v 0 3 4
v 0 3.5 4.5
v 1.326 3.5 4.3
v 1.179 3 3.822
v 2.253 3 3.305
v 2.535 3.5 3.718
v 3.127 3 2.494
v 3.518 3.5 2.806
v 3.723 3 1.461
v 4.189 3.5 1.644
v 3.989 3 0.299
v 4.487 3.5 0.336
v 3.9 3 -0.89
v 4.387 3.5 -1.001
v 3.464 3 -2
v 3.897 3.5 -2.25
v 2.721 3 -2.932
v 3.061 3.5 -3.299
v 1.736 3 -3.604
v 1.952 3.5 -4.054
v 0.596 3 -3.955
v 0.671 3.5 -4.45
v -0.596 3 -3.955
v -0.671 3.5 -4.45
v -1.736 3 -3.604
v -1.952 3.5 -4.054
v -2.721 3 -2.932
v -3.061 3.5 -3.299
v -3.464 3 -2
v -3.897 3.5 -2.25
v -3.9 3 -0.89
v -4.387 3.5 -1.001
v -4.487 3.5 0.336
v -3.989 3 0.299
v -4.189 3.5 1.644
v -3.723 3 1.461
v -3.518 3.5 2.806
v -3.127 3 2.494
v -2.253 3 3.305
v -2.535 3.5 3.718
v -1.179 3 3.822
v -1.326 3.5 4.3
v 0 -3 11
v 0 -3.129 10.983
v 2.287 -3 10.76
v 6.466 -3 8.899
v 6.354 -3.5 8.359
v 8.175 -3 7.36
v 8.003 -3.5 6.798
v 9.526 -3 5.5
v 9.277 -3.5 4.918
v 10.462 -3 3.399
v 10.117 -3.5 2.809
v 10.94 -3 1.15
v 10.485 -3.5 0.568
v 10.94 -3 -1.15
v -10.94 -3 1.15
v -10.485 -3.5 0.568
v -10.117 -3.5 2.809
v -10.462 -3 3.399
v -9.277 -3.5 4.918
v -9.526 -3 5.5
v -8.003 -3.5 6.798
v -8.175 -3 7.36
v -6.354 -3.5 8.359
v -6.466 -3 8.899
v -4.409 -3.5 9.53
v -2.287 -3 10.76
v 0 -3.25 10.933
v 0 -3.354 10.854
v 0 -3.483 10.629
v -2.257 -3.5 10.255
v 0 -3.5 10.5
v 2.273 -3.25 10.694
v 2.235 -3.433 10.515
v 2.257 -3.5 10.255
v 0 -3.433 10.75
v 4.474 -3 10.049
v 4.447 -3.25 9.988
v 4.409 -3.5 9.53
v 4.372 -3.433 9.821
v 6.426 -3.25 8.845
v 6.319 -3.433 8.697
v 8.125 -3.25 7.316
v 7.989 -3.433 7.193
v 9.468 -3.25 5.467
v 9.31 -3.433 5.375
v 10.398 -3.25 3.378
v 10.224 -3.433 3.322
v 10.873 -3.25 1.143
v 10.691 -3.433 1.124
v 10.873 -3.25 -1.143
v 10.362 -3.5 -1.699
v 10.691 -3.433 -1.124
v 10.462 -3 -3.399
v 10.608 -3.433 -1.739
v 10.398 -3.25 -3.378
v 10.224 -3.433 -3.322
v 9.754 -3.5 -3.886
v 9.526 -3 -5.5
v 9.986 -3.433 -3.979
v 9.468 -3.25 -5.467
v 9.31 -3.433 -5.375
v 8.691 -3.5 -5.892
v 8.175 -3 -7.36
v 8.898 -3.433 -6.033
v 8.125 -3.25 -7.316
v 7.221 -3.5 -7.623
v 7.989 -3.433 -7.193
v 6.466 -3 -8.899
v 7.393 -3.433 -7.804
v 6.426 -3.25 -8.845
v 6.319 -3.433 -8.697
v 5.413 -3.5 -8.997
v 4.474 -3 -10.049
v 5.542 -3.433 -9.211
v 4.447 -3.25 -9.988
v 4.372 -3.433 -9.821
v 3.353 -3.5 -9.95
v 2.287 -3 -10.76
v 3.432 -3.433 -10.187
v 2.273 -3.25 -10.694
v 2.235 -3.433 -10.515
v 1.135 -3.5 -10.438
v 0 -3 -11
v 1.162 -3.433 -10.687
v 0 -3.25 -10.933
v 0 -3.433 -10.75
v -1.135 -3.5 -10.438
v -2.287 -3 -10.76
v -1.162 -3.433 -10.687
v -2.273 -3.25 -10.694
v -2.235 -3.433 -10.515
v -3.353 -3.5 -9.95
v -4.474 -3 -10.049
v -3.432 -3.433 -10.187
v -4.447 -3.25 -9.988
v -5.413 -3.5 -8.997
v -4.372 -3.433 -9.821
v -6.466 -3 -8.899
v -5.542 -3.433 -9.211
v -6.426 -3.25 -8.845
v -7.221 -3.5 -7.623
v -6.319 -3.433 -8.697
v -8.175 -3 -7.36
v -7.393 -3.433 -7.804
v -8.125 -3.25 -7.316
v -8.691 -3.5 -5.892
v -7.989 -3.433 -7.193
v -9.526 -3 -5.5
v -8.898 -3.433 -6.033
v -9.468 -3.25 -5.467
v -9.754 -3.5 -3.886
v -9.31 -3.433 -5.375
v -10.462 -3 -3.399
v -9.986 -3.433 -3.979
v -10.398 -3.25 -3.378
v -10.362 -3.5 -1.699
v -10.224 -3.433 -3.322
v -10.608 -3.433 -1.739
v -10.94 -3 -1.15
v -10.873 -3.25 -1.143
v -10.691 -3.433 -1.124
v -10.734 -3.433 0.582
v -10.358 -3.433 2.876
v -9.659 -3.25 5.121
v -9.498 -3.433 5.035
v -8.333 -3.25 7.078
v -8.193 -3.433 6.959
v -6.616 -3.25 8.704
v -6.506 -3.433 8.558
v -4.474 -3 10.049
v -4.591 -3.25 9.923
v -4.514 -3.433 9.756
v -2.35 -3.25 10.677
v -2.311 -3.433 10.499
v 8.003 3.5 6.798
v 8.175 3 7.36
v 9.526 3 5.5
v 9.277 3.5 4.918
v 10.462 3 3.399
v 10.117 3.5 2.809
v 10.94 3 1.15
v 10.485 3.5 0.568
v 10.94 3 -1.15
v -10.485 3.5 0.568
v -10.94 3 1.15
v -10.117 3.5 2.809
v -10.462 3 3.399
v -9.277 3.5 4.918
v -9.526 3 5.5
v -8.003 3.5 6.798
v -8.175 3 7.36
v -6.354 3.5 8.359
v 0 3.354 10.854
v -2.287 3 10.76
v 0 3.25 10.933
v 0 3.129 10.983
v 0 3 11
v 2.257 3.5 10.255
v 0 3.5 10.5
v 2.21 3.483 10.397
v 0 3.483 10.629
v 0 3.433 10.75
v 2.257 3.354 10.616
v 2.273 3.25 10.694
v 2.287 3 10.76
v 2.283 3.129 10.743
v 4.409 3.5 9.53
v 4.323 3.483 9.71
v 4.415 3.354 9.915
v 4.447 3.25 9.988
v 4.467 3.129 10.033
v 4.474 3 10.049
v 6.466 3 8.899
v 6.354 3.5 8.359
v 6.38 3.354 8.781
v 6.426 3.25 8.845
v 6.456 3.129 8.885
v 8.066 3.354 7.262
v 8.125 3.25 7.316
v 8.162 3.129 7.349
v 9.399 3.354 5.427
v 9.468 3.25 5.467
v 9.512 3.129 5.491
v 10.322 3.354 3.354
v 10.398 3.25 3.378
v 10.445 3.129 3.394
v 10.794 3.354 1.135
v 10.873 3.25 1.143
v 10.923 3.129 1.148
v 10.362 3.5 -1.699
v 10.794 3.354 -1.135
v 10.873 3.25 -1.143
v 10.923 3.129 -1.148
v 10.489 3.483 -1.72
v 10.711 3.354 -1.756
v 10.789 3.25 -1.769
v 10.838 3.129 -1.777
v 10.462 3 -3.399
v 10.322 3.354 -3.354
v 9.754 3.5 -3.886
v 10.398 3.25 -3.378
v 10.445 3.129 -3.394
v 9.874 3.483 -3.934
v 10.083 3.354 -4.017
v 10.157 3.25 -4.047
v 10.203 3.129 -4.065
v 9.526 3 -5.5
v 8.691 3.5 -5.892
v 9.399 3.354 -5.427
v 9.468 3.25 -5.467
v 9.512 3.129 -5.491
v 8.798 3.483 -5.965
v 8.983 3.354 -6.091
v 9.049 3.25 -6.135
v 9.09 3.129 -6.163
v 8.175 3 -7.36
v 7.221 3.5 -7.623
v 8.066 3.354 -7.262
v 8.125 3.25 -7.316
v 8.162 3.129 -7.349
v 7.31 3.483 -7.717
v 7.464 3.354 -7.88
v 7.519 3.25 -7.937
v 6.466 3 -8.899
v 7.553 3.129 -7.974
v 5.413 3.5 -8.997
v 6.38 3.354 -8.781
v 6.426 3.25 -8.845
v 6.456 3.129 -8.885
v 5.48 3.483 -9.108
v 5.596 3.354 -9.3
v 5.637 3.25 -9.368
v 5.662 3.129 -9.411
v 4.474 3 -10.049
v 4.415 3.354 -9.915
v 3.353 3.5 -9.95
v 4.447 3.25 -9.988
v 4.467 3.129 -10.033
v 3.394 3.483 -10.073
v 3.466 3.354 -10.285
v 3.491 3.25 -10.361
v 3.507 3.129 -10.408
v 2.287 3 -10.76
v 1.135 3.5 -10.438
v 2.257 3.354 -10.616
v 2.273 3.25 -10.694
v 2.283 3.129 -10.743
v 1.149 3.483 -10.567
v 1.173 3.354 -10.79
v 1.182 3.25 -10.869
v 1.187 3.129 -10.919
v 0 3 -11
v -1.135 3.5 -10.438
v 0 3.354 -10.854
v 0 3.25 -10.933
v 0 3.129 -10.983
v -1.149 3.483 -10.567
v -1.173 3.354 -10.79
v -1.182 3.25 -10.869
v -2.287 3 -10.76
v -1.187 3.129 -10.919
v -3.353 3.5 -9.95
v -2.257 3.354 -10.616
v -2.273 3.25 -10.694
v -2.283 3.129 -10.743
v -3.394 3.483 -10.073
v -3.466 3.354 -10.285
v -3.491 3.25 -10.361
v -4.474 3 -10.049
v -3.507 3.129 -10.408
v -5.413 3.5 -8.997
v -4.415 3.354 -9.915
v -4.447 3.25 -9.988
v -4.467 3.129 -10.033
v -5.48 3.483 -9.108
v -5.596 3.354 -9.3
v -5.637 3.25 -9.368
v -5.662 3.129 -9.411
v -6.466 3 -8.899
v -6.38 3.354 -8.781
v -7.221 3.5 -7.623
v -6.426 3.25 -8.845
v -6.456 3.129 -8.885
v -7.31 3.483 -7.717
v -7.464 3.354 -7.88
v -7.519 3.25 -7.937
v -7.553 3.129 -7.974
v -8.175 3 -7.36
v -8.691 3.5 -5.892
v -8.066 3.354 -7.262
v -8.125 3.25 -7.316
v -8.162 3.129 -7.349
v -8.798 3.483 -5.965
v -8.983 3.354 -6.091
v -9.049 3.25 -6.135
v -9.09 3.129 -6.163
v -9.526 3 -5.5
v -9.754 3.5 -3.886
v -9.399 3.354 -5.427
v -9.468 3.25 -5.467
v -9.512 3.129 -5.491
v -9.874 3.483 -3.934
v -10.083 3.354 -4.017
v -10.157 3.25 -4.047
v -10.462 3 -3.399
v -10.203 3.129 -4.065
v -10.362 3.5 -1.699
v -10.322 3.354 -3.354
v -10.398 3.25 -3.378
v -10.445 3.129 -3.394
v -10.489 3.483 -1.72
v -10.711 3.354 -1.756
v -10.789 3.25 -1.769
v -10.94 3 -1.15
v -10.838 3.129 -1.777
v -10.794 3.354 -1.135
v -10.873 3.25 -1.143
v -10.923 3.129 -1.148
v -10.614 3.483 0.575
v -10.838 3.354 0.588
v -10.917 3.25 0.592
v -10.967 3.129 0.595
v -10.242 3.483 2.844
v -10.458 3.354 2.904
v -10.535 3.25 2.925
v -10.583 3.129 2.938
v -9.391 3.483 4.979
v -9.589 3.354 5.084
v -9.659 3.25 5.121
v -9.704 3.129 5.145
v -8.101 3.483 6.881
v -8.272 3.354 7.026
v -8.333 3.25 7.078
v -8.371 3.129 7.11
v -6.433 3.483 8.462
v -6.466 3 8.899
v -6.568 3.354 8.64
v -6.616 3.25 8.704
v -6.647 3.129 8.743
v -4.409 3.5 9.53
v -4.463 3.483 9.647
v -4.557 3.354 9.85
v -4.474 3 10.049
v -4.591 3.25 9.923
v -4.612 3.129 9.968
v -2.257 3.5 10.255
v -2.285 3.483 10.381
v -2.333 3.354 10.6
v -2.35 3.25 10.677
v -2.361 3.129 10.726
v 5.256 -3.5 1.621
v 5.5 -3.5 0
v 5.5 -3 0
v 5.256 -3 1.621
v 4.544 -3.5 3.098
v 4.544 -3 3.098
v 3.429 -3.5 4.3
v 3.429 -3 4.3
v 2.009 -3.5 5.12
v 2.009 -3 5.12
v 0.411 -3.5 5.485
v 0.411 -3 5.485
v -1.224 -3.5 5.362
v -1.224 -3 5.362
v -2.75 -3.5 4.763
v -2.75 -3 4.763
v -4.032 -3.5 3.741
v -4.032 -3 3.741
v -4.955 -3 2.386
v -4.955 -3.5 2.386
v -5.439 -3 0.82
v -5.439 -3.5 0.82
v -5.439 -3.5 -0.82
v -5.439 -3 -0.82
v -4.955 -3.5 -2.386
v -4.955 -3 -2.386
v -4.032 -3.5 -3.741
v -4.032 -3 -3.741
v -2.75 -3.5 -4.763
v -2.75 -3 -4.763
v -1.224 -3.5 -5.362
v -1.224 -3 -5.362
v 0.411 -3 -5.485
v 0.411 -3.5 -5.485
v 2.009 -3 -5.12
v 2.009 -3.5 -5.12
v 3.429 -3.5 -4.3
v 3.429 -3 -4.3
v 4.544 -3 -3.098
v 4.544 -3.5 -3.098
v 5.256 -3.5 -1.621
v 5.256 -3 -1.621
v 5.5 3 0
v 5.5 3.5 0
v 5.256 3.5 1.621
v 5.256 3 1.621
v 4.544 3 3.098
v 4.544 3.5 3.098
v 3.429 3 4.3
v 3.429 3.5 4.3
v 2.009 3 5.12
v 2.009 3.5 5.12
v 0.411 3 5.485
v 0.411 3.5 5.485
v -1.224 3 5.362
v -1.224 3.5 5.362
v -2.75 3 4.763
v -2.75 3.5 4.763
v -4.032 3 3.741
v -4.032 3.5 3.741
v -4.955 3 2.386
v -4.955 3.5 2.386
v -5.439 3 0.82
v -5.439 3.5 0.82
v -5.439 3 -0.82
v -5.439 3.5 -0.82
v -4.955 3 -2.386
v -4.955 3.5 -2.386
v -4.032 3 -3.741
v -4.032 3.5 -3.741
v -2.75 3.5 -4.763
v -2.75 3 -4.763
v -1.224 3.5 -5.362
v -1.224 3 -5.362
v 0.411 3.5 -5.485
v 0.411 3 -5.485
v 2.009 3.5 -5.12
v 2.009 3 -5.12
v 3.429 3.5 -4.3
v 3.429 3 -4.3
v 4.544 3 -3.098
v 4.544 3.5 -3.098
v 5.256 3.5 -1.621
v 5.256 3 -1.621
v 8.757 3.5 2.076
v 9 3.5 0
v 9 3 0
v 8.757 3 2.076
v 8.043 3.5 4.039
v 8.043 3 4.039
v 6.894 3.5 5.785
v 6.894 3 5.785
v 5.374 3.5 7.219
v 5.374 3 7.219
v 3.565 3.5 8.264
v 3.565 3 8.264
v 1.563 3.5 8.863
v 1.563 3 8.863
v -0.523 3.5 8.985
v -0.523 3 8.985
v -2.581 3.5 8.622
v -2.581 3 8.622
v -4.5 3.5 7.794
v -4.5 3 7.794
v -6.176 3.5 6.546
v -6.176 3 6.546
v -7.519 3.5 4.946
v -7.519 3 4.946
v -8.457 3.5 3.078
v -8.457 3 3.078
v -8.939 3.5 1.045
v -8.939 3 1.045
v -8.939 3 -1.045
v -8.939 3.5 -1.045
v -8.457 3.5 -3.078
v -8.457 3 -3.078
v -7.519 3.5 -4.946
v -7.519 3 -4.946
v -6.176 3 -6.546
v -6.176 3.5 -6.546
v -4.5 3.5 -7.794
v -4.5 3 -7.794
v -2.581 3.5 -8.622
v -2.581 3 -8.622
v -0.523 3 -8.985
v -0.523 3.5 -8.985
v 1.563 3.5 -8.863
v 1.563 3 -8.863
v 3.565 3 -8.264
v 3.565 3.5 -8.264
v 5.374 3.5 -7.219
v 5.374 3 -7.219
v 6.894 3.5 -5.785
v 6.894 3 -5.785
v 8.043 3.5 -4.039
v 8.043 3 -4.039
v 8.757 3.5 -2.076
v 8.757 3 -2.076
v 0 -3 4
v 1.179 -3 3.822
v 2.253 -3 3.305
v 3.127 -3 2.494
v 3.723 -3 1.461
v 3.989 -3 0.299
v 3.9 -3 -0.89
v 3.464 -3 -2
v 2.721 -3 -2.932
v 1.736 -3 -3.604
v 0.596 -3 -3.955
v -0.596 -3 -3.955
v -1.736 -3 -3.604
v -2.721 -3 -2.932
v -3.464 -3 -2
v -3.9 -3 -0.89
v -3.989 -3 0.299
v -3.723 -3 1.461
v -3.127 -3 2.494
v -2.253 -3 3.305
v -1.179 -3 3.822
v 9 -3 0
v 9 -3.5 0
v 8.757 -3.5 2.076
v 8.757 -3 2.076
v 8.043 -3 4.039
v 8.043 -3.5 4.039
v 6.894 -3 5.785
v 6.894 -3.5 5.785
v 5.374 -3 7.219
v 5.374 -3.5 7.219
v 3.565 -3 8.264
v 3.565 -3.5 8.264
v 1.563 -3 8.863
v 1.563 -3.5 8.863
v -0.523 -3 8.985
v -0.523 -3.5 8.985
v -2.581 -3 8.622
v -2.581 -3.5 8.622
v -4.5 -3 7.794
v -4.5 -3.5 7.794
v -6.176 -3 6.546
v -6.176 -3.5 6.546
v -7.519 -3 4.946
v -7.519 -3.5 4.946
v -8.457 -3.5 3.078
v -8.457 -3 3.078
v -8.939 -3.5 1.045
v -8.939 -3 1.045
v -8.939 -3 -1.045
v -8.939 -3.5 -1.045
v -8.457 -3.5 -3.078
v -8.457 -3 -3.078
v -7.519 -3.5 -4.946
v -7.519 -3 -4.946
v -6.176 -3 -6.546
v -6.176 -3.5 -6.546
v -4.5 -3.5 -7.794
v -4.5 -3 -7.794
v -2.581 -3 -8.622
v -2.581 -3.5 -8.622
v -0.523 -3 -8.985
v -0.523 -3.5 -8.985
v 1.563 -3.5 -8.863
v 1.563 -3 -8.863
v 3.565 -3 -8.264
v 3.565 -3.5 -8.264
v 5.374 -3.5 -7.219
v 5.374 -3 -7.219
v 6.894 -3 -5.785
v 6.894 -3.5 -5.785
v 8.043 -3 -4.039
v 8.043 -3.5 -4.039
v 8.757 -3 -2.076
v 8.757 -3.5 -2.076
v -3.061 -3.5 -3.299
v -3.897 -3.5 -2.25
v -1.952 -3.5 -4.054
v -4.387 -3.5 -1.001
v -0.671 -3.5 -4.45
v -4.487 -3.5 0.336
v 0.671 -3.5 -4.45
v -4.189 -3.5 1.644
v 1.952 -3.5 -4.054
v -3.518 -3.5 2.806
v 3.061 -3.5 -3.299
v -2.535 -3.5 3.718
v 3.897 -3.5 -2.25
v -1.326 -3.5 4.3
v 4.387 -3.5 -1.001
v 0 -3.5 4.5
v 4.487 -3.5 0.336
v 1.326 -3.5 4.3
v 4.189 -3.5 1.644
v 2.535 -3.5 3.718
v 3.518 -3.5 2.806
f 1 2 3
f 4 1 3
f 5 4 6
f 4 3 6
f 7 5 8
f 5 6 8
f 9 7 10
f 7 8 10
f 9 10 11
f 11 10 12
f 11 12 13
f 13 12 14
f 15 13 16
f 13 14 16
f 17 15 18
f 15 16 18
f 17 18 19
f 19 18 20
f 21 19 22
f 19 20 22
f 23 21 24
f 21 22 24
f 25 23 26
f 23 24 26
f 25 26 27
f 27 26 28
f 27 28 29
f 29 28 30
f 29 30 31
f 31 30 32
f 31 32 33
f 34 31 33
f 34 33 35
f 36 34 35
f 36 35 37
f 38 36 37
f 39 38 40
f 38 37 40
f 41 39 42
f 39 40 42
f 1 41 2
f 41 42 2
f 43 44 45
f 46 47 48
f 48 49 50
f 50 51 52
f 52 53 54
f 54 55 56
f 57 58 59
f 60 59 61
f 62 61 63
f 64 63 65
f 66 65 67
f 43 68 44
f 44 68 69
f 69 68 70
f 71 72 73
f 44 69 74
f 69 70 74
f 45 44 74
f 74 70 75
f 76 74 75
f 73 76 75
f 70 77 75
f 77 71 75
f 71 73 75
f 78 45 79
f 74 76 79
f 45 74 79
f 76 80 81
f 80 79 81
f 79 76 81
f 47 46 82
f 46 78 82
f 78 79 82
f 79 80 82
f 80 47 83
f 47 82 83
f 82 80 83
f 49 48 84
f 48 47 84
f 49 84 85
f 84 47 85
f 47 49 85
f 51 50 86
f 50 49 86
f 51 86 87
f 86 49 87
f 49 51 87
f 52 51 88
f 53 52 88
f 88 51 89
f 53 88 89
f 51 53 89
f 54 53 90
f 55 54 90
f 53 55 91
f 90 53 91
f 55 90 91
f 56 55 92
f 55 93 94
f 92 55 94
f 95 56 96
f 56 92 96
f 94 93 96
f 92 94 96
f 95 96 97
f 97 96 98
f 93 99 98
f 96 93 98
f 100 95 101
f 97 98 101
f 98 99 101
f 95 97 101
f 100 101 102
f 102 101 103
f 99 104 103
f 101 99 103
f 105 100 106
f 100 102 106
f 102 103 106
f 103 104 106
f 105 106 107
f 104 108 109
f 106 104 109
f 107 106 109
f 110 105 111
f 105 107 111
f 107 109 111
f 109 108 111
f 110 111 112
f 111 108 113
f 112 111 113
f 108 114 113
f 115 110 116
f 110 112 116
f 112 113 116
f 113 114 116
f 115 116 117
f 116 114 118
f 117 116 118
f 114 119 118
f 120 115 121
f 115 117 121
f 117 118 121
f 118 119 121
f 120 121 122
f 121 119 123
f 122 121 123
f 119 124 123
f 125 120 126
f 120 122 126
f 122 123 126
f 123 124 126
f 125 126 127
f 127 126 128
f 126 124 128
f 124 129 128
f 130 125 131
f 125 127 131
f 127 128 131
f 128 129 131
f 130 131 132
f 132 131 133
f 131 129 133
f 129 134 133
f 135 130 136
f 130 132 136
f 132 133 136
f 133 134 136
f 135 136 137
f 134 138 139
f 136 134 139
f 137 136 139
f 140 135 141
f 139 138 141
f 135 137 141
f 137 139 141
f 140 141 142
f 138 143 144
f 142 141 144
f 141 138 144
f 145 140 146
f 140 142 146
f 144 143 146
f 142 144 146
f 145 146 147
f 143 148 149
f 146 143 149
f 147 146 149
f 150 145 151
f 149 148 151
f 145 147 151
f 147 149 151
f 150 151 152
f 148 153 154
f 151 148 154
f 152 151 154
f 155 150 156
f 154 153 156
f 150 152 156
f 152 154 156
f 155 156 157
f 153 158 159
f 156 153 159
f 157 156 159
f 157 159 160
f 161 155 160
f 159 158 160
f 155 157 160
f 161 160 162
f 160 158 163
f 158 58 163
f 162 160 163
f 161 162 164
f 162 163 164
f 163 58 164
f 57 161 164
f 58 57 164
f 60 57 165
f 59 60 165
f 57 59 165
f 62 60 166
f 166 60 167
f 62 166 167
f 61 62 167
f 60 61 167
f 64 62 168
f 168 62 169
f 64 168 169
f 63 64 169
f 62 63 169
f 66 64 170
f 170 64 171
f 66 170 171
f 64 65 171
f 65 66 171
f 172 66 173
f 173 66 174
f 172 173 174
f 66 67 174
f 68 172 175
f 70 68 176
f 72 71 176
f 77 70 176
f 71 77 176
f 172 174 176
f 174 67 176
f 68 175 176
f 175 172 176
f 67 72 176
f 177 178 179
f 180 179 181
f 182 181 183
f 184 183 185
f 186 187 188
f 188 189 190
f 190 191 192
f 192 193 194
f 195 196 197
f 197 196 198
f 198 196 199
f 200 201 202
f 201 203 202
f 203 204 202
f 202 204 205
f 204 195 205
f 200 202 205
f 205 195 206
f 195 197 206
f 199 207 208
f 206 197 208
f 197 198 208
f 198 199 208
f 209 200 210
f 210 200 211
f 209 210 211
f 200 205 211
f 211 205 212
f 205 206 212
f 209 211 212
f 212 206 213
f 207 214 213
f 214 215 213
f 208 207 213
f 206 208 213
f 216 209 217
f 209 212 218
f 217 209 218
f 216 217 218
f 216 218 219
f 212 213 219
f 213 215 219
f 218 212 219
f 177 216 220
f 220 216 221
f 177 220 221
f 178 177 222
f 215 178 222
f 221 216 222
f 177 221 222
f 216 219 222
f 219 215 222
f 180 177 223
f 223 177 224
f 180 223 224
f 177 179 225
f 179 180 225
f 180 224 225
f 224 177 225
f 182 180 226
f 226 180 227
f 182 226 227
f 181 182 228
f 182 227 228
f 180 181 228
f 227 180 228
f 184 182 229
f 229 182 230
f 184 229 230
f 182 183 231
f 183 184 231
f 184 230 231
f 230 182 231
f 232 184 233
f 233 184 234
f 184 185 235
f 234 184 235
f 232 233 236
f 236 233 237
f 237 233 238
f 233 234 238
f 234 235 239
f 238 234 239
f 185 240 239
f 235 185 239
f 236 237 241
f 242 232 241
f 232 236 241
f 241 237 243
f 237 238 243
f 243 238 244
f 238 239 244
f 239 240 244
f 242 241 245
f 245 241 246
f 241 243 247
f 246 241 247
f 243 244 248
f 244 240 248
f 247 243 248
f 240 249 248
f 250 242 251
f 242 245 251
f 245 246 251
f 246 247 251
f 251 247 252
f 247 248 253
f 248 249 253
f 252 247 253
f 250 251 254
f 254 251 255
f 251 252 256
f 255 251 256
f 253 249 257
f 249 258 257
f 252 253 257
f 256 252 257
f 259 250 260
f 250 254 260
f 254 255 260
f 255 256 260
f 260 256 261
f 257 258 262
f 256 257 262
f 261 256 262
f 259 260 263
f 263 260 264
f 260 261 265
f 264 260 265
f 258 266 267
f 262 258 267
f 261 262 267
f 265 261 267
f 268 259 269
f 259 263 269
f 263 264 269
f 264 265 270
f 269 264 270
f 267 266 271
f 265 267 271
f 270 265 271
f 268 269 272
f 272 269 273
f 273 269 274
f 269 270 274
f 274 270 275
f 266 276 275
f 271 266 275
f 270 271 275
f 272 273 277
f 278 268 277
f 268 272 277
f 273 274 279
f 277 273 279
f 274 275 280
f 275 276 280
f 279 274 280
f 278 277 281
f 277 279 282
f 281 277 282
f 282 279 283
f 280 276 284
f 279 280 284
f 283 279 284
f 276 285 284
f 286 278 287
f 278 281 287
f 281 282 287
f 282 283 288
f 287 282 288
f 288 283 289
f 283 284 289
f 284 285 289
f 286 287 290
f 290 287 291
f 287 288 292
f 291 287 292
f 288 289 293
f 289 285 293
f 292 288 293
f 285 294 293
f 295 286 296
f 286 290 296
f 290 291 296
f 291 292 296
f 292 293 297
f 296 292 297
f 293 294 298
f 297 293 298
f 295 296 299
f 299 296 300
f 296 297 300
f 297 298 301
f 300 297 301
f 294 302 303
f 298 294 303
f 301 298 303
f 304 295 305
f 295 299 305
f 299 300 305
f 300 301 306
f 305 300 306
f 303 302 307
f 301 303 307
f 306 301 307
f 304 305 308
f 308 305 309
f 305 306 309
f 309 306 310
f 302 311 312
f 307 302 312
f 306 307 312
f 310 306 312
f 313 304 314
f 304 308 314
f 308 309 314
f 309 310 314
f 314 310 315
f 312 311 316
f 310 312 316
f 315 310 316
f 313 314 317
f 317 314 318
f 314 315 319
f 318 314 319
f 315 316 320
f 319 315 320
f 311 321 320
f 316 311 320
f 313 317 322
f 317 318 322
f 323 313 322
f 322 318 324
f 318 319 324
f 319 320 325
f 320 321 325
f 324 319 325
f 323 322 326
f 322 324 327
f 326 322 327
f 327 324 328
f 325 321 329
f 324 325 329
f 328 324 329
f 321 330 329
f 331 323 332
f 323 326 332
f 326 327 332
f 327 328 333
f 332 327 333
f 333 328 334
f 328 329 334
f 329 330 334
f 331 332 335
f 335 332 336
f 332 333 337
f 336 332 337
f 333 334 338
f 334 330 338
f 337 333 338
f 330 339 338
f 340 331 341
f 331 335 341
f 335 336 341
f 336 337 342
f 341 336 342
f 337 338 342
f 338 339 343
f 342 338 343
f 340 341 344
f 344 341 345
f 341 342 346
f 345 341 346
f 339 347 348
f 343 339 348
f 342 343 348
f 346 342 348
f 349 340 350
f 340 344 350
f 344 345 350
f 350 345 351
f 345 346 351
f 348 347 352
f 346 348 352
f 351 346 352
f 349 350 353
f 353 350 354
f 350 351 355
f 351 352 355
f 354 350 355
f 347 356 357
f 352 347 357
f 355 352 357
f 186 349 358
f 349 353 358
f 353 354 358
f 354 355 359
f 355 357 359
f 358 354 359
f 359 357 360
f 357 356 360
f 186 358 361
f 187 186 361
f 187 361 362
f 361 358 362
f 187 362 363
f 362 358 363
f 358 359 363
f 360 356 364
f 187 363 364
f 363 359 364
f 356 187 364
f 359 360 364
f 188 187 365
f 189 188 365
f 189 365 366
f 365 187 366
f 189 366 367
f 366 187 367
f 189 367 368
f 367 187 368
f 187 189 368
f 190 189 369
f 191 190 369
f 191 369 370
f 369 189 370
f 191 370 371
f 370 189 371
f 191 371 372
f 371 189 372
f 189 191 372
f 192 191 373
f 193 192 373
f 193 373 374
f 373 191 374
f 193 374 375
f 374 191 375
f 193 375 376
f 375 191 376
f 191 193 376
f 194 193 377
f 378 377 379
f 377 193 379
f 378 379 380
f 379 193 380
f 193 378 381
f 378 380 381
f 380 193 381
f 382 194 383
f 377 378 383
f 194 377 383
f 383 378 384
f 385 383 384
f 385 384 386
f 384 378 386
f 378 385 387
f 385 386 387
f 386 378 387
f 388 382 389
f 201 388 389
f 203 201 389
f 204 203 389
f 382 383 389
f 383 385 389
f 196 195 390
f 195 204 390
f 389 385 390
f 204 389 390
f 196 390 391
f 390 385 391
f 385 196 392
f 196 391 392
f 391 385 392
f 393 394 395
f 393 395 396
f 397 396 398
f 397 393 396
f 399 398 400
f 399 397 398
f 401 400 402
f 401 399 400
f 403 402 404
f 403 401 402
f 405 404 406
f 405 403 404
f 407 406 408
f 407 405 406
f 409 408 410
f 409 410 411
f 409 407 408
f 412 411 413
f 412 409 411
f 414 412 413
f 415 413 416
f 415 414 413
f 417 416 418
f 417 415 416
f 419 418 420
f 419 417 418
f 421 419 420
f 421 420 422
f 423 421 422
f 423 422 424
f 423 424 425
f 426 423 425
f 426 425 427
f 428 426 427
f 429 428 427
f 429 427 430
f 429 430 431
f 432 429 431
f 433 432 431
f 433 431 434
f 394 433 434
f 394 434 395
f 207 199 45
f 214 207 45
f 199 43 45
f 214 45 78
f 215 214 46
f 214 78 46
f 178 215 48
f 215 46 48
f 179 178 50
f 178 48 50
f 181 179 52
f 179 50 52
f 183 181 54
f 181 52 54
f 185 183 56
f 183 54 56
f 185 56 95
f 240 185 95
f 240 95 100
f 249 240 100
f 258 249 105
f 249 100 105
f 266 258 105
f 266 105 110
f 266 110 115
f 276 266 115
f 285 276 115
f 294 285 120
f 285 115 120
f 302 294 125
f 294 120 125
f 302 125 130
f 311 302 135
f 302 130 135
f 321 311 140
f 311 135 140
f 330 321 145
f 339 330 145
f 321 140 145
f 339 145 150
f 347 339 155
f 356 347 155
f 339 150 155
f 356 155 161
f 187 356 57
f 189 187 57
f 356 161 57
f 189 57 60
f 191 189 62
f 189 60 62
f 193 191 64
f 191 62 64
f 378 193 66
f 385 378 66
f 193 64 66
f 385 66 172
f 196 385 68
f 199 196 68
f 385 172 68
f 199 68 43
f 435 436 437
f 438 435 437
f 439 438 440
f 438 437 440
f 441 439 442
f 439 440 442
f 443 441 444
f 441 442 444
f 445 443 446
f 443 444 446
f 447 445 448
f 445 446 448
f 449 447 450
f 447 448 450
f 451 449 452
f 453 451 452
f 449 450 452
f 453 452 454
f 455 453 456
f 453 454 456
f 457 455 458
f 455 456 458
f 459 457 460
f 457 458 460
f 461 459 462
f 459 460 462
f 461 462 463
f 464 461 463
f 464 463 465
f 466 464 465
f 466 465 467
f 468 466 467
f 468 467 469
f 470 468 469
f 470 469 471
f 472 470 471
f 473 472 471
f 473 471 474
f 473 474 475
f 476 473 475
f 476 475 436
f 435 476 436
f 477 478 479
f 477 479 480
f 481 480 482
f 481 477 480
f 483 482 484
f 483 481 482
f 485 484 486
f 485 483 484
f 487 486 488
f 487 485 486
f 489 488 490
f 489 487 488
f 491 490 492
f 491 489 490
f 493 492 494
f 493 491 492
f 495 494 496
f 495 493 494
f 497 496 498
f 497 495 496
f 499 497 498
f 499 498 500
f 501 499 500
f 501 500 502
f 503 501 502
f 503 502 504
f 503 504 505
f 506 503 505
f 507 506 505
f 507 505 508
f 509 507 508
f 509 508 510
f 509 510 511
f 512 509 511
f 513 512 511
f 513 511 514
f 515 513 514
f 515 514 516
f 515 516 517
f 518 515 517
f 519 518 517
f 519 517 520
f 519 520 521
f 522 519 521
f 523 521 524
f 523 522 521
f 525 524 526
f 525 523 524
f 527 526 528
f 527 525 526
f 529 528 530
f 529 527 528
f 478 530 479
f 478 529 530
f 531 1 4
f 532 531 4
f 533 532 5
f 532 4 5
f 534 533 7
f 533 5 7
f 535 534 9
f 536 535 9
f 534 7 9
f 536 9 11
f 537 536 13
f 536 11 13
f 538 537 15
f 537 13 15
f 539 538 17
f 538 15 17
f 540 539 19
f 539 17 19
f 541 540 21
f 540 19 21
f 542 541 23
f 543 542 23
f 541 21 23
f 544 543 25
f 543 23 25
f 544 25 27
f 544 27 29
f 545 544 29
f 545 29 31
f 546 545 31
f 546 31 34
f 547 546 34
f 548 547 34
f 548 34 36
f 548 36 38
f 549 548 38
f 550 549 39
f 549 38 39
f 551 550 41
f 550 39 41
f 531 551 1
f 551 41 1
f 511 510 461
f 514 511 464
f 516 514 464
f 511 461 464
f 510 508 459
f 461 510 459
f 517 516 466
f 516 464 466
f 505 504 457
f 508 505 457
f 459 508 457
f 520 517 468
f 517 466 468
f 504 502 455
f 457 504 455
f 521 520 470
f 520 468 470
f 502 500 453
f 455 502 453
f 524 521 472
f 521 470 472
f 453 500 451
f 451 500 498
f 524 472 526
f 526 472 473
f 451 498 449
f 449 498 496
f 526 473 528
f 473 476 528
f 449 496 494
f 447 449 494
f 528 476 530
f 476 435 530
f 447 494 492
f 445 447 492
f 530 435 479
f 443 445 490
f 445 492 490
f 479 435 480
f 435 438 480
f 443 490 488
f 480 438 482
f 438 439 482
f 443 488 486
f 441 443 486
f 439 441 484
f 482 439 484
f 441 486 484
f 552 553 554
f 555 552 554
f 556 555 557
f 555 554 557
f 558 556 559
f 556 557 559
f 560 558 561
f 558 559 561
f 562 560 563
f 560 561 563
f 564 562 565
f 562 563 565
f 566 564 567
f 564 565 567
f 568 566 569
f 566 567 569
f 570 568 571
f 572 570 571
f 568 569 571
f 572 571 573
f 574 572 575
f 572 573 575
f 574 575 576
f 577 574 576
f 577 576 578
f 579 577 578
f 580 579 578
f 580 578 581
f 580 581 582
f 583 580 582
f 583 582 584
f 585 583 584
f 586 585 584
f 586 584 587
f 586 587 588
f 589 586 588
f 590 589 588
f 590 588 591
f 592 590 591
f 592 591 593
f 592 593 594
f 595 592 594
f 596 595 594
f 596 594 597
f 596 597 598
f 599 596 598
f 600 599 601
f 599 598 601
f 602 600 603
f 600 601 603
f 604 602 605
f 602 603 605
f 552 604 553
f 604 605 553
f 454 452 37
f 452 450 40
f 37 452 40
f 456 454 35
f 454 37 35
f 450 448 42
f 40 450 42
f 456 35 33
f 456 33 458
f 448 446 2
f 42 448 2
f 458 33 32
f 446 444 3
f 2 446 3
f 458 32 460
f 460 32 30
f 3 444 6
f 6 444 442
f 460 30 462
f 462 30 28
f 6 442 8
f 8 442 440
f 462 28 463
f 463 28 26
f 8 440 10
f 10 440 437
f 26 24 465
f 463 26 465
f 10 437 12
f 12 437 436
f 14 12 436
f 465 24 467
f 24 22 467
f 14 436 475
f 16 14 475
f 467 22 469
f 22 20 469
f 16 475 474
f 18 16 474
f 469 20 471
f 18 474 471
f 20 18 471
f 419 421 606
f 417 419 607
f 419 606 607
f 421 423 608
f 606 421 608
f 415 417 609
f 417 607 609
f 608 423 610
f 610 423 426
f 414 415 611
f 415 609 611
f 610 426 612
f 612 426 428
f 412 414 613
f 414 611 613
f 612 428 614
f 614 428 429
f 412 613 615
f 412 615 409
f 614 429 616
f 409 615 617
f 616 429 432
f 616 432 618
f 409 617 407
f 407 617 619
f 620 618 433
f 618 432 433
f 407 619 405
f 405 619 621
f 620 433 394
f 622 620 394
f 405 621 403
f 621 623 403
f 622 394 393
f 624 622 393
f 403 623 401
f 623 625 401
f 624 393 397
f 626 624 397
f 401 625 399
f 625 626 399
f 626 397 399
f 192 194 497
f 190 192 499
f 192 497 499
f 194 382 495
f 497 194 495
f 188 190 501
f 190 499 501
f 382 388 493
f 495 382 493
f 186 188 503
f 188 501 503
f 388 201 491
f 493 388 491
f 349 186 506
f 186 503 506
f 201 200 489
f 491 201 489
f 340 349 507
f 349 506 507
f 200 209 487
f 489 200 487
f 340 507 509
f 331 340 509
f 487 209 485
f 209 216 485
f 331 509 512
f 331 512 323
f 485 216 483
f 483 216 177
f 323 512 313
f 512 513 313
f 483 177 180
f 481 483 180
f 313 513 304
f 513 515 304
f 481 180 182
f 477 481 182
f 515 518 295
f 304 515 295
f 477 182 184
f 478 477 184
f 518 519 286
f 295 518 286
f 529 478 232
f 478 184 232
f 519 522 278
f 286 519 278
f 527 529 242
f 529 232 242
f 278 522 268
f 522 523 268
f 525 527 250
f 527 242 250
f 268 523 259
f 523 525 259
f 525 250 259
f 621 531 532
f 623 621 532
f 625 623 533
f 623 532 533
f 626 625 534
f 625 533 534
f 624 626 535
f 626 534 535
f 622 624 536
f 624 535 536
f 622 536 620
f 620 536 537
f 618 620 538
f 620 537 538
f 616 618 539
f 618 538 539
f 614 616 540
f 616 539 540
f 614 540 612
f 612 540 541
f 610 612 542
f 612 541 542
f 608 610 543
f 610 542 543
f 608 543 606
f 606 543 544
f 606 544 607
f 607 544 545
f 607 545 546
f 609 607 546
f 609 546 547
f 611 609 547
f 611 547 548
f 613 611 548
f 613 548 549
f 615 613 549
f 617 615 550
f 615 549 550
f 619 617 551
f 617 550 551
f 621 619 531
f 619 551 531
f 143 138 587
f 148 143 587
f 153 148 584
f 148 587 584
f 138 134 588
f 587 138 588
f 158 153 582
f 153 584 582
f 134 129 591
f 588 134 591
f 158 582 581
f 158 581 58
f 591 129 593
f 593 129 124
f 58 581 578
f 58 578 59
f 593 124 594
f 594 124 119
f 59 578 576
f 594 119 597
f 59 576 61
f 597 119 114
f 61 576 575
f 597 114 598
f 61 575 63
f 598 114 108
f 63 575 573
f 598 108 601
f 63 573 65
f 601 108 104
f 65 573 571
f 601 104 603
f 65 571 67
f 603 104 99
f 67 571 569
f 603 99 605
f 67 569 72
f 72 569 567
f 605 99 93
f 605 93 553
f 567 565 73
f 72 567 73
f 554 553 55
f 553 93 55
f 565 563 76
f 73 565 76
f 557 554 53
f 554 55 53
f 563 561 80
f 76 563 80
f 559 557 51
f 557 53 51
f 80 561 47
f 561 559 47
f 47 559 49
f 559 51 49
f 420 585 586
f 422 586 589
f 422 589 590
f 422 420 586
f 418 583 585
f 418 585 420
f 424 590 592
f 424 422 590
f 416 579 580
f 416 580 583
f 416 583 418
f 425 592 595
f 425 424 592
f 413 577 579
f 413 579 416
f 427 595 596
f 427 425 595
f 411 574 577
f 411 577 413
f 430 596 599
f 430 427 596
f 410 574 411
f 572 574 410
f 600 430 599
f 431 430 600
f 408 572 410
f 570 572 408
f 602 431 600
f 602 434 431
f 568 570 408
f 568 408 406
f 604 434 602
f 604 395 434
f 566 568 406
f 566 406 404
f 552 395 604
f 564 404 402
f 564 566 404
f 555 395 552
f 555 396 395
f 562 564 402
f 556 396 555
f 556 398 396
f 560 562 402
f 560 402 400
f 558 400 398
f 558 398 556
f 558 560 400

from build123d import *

# Parameters (mm, degrees)
F2_SIZE  = 0.5
F5_R     = 9
F5_R_2   = 5.5
F6_DEPTH = 2
F7_R     = 9
F7_R_2   = 5.5
F8_DEPTH = 2


with BuildPart() as f1:
    # F0 (on Right) → F1 (revolve)
    with BuildSketch(Plane.YZ):
        with BuildLine():
            Line((-3.5, 10.5), (-3.5, 4))
            Line((-3.5, 4), (3.5, 4))
            Line((3.5, 4), (3.5, 10.5))
            ThreePointArc((3.5, 10.5), (3.353553, 10.853553), (3, 11))
            Line((3, 11), (-3, 11))
            ThreePointArc((-3, 11), (-3.353553, 10.853553), (-3.5, 10.5))
        make_face()
    revolve(axis=Axis((0, 1.946479, 0), (0, 1, 0)))

    # F2
    f2_edges = [f1.edges().sort_by_distance(p)[0] for p in [
        (0, 3.5, -4),
        (0, -3.5, -4),
    ]]
    chamfer(f2_edges, length=F2_SIZE)

    # F5 (on offset) → F6 (cut)
    with BuildSketch(Plane.XZ.offset(-5)):
        Circle(F5_R)
        Circle(F5_R_2, mode=Mode.SUBTRACT)
    extrude(amount=F6_DEPTH, mode=Mode.SUBTRACT)

    # F7 (on offset) → F8 (cut)
    with BuildSketch(Plane.XZ.offset(5)):
        Circle(F7_R)
        Circle(F7_R_2, mode=Mode.SUBTRACT)
    extrude(amount=-F8_DEPTH, mode=Mode.SUBTRACT)


solid = f1.part
